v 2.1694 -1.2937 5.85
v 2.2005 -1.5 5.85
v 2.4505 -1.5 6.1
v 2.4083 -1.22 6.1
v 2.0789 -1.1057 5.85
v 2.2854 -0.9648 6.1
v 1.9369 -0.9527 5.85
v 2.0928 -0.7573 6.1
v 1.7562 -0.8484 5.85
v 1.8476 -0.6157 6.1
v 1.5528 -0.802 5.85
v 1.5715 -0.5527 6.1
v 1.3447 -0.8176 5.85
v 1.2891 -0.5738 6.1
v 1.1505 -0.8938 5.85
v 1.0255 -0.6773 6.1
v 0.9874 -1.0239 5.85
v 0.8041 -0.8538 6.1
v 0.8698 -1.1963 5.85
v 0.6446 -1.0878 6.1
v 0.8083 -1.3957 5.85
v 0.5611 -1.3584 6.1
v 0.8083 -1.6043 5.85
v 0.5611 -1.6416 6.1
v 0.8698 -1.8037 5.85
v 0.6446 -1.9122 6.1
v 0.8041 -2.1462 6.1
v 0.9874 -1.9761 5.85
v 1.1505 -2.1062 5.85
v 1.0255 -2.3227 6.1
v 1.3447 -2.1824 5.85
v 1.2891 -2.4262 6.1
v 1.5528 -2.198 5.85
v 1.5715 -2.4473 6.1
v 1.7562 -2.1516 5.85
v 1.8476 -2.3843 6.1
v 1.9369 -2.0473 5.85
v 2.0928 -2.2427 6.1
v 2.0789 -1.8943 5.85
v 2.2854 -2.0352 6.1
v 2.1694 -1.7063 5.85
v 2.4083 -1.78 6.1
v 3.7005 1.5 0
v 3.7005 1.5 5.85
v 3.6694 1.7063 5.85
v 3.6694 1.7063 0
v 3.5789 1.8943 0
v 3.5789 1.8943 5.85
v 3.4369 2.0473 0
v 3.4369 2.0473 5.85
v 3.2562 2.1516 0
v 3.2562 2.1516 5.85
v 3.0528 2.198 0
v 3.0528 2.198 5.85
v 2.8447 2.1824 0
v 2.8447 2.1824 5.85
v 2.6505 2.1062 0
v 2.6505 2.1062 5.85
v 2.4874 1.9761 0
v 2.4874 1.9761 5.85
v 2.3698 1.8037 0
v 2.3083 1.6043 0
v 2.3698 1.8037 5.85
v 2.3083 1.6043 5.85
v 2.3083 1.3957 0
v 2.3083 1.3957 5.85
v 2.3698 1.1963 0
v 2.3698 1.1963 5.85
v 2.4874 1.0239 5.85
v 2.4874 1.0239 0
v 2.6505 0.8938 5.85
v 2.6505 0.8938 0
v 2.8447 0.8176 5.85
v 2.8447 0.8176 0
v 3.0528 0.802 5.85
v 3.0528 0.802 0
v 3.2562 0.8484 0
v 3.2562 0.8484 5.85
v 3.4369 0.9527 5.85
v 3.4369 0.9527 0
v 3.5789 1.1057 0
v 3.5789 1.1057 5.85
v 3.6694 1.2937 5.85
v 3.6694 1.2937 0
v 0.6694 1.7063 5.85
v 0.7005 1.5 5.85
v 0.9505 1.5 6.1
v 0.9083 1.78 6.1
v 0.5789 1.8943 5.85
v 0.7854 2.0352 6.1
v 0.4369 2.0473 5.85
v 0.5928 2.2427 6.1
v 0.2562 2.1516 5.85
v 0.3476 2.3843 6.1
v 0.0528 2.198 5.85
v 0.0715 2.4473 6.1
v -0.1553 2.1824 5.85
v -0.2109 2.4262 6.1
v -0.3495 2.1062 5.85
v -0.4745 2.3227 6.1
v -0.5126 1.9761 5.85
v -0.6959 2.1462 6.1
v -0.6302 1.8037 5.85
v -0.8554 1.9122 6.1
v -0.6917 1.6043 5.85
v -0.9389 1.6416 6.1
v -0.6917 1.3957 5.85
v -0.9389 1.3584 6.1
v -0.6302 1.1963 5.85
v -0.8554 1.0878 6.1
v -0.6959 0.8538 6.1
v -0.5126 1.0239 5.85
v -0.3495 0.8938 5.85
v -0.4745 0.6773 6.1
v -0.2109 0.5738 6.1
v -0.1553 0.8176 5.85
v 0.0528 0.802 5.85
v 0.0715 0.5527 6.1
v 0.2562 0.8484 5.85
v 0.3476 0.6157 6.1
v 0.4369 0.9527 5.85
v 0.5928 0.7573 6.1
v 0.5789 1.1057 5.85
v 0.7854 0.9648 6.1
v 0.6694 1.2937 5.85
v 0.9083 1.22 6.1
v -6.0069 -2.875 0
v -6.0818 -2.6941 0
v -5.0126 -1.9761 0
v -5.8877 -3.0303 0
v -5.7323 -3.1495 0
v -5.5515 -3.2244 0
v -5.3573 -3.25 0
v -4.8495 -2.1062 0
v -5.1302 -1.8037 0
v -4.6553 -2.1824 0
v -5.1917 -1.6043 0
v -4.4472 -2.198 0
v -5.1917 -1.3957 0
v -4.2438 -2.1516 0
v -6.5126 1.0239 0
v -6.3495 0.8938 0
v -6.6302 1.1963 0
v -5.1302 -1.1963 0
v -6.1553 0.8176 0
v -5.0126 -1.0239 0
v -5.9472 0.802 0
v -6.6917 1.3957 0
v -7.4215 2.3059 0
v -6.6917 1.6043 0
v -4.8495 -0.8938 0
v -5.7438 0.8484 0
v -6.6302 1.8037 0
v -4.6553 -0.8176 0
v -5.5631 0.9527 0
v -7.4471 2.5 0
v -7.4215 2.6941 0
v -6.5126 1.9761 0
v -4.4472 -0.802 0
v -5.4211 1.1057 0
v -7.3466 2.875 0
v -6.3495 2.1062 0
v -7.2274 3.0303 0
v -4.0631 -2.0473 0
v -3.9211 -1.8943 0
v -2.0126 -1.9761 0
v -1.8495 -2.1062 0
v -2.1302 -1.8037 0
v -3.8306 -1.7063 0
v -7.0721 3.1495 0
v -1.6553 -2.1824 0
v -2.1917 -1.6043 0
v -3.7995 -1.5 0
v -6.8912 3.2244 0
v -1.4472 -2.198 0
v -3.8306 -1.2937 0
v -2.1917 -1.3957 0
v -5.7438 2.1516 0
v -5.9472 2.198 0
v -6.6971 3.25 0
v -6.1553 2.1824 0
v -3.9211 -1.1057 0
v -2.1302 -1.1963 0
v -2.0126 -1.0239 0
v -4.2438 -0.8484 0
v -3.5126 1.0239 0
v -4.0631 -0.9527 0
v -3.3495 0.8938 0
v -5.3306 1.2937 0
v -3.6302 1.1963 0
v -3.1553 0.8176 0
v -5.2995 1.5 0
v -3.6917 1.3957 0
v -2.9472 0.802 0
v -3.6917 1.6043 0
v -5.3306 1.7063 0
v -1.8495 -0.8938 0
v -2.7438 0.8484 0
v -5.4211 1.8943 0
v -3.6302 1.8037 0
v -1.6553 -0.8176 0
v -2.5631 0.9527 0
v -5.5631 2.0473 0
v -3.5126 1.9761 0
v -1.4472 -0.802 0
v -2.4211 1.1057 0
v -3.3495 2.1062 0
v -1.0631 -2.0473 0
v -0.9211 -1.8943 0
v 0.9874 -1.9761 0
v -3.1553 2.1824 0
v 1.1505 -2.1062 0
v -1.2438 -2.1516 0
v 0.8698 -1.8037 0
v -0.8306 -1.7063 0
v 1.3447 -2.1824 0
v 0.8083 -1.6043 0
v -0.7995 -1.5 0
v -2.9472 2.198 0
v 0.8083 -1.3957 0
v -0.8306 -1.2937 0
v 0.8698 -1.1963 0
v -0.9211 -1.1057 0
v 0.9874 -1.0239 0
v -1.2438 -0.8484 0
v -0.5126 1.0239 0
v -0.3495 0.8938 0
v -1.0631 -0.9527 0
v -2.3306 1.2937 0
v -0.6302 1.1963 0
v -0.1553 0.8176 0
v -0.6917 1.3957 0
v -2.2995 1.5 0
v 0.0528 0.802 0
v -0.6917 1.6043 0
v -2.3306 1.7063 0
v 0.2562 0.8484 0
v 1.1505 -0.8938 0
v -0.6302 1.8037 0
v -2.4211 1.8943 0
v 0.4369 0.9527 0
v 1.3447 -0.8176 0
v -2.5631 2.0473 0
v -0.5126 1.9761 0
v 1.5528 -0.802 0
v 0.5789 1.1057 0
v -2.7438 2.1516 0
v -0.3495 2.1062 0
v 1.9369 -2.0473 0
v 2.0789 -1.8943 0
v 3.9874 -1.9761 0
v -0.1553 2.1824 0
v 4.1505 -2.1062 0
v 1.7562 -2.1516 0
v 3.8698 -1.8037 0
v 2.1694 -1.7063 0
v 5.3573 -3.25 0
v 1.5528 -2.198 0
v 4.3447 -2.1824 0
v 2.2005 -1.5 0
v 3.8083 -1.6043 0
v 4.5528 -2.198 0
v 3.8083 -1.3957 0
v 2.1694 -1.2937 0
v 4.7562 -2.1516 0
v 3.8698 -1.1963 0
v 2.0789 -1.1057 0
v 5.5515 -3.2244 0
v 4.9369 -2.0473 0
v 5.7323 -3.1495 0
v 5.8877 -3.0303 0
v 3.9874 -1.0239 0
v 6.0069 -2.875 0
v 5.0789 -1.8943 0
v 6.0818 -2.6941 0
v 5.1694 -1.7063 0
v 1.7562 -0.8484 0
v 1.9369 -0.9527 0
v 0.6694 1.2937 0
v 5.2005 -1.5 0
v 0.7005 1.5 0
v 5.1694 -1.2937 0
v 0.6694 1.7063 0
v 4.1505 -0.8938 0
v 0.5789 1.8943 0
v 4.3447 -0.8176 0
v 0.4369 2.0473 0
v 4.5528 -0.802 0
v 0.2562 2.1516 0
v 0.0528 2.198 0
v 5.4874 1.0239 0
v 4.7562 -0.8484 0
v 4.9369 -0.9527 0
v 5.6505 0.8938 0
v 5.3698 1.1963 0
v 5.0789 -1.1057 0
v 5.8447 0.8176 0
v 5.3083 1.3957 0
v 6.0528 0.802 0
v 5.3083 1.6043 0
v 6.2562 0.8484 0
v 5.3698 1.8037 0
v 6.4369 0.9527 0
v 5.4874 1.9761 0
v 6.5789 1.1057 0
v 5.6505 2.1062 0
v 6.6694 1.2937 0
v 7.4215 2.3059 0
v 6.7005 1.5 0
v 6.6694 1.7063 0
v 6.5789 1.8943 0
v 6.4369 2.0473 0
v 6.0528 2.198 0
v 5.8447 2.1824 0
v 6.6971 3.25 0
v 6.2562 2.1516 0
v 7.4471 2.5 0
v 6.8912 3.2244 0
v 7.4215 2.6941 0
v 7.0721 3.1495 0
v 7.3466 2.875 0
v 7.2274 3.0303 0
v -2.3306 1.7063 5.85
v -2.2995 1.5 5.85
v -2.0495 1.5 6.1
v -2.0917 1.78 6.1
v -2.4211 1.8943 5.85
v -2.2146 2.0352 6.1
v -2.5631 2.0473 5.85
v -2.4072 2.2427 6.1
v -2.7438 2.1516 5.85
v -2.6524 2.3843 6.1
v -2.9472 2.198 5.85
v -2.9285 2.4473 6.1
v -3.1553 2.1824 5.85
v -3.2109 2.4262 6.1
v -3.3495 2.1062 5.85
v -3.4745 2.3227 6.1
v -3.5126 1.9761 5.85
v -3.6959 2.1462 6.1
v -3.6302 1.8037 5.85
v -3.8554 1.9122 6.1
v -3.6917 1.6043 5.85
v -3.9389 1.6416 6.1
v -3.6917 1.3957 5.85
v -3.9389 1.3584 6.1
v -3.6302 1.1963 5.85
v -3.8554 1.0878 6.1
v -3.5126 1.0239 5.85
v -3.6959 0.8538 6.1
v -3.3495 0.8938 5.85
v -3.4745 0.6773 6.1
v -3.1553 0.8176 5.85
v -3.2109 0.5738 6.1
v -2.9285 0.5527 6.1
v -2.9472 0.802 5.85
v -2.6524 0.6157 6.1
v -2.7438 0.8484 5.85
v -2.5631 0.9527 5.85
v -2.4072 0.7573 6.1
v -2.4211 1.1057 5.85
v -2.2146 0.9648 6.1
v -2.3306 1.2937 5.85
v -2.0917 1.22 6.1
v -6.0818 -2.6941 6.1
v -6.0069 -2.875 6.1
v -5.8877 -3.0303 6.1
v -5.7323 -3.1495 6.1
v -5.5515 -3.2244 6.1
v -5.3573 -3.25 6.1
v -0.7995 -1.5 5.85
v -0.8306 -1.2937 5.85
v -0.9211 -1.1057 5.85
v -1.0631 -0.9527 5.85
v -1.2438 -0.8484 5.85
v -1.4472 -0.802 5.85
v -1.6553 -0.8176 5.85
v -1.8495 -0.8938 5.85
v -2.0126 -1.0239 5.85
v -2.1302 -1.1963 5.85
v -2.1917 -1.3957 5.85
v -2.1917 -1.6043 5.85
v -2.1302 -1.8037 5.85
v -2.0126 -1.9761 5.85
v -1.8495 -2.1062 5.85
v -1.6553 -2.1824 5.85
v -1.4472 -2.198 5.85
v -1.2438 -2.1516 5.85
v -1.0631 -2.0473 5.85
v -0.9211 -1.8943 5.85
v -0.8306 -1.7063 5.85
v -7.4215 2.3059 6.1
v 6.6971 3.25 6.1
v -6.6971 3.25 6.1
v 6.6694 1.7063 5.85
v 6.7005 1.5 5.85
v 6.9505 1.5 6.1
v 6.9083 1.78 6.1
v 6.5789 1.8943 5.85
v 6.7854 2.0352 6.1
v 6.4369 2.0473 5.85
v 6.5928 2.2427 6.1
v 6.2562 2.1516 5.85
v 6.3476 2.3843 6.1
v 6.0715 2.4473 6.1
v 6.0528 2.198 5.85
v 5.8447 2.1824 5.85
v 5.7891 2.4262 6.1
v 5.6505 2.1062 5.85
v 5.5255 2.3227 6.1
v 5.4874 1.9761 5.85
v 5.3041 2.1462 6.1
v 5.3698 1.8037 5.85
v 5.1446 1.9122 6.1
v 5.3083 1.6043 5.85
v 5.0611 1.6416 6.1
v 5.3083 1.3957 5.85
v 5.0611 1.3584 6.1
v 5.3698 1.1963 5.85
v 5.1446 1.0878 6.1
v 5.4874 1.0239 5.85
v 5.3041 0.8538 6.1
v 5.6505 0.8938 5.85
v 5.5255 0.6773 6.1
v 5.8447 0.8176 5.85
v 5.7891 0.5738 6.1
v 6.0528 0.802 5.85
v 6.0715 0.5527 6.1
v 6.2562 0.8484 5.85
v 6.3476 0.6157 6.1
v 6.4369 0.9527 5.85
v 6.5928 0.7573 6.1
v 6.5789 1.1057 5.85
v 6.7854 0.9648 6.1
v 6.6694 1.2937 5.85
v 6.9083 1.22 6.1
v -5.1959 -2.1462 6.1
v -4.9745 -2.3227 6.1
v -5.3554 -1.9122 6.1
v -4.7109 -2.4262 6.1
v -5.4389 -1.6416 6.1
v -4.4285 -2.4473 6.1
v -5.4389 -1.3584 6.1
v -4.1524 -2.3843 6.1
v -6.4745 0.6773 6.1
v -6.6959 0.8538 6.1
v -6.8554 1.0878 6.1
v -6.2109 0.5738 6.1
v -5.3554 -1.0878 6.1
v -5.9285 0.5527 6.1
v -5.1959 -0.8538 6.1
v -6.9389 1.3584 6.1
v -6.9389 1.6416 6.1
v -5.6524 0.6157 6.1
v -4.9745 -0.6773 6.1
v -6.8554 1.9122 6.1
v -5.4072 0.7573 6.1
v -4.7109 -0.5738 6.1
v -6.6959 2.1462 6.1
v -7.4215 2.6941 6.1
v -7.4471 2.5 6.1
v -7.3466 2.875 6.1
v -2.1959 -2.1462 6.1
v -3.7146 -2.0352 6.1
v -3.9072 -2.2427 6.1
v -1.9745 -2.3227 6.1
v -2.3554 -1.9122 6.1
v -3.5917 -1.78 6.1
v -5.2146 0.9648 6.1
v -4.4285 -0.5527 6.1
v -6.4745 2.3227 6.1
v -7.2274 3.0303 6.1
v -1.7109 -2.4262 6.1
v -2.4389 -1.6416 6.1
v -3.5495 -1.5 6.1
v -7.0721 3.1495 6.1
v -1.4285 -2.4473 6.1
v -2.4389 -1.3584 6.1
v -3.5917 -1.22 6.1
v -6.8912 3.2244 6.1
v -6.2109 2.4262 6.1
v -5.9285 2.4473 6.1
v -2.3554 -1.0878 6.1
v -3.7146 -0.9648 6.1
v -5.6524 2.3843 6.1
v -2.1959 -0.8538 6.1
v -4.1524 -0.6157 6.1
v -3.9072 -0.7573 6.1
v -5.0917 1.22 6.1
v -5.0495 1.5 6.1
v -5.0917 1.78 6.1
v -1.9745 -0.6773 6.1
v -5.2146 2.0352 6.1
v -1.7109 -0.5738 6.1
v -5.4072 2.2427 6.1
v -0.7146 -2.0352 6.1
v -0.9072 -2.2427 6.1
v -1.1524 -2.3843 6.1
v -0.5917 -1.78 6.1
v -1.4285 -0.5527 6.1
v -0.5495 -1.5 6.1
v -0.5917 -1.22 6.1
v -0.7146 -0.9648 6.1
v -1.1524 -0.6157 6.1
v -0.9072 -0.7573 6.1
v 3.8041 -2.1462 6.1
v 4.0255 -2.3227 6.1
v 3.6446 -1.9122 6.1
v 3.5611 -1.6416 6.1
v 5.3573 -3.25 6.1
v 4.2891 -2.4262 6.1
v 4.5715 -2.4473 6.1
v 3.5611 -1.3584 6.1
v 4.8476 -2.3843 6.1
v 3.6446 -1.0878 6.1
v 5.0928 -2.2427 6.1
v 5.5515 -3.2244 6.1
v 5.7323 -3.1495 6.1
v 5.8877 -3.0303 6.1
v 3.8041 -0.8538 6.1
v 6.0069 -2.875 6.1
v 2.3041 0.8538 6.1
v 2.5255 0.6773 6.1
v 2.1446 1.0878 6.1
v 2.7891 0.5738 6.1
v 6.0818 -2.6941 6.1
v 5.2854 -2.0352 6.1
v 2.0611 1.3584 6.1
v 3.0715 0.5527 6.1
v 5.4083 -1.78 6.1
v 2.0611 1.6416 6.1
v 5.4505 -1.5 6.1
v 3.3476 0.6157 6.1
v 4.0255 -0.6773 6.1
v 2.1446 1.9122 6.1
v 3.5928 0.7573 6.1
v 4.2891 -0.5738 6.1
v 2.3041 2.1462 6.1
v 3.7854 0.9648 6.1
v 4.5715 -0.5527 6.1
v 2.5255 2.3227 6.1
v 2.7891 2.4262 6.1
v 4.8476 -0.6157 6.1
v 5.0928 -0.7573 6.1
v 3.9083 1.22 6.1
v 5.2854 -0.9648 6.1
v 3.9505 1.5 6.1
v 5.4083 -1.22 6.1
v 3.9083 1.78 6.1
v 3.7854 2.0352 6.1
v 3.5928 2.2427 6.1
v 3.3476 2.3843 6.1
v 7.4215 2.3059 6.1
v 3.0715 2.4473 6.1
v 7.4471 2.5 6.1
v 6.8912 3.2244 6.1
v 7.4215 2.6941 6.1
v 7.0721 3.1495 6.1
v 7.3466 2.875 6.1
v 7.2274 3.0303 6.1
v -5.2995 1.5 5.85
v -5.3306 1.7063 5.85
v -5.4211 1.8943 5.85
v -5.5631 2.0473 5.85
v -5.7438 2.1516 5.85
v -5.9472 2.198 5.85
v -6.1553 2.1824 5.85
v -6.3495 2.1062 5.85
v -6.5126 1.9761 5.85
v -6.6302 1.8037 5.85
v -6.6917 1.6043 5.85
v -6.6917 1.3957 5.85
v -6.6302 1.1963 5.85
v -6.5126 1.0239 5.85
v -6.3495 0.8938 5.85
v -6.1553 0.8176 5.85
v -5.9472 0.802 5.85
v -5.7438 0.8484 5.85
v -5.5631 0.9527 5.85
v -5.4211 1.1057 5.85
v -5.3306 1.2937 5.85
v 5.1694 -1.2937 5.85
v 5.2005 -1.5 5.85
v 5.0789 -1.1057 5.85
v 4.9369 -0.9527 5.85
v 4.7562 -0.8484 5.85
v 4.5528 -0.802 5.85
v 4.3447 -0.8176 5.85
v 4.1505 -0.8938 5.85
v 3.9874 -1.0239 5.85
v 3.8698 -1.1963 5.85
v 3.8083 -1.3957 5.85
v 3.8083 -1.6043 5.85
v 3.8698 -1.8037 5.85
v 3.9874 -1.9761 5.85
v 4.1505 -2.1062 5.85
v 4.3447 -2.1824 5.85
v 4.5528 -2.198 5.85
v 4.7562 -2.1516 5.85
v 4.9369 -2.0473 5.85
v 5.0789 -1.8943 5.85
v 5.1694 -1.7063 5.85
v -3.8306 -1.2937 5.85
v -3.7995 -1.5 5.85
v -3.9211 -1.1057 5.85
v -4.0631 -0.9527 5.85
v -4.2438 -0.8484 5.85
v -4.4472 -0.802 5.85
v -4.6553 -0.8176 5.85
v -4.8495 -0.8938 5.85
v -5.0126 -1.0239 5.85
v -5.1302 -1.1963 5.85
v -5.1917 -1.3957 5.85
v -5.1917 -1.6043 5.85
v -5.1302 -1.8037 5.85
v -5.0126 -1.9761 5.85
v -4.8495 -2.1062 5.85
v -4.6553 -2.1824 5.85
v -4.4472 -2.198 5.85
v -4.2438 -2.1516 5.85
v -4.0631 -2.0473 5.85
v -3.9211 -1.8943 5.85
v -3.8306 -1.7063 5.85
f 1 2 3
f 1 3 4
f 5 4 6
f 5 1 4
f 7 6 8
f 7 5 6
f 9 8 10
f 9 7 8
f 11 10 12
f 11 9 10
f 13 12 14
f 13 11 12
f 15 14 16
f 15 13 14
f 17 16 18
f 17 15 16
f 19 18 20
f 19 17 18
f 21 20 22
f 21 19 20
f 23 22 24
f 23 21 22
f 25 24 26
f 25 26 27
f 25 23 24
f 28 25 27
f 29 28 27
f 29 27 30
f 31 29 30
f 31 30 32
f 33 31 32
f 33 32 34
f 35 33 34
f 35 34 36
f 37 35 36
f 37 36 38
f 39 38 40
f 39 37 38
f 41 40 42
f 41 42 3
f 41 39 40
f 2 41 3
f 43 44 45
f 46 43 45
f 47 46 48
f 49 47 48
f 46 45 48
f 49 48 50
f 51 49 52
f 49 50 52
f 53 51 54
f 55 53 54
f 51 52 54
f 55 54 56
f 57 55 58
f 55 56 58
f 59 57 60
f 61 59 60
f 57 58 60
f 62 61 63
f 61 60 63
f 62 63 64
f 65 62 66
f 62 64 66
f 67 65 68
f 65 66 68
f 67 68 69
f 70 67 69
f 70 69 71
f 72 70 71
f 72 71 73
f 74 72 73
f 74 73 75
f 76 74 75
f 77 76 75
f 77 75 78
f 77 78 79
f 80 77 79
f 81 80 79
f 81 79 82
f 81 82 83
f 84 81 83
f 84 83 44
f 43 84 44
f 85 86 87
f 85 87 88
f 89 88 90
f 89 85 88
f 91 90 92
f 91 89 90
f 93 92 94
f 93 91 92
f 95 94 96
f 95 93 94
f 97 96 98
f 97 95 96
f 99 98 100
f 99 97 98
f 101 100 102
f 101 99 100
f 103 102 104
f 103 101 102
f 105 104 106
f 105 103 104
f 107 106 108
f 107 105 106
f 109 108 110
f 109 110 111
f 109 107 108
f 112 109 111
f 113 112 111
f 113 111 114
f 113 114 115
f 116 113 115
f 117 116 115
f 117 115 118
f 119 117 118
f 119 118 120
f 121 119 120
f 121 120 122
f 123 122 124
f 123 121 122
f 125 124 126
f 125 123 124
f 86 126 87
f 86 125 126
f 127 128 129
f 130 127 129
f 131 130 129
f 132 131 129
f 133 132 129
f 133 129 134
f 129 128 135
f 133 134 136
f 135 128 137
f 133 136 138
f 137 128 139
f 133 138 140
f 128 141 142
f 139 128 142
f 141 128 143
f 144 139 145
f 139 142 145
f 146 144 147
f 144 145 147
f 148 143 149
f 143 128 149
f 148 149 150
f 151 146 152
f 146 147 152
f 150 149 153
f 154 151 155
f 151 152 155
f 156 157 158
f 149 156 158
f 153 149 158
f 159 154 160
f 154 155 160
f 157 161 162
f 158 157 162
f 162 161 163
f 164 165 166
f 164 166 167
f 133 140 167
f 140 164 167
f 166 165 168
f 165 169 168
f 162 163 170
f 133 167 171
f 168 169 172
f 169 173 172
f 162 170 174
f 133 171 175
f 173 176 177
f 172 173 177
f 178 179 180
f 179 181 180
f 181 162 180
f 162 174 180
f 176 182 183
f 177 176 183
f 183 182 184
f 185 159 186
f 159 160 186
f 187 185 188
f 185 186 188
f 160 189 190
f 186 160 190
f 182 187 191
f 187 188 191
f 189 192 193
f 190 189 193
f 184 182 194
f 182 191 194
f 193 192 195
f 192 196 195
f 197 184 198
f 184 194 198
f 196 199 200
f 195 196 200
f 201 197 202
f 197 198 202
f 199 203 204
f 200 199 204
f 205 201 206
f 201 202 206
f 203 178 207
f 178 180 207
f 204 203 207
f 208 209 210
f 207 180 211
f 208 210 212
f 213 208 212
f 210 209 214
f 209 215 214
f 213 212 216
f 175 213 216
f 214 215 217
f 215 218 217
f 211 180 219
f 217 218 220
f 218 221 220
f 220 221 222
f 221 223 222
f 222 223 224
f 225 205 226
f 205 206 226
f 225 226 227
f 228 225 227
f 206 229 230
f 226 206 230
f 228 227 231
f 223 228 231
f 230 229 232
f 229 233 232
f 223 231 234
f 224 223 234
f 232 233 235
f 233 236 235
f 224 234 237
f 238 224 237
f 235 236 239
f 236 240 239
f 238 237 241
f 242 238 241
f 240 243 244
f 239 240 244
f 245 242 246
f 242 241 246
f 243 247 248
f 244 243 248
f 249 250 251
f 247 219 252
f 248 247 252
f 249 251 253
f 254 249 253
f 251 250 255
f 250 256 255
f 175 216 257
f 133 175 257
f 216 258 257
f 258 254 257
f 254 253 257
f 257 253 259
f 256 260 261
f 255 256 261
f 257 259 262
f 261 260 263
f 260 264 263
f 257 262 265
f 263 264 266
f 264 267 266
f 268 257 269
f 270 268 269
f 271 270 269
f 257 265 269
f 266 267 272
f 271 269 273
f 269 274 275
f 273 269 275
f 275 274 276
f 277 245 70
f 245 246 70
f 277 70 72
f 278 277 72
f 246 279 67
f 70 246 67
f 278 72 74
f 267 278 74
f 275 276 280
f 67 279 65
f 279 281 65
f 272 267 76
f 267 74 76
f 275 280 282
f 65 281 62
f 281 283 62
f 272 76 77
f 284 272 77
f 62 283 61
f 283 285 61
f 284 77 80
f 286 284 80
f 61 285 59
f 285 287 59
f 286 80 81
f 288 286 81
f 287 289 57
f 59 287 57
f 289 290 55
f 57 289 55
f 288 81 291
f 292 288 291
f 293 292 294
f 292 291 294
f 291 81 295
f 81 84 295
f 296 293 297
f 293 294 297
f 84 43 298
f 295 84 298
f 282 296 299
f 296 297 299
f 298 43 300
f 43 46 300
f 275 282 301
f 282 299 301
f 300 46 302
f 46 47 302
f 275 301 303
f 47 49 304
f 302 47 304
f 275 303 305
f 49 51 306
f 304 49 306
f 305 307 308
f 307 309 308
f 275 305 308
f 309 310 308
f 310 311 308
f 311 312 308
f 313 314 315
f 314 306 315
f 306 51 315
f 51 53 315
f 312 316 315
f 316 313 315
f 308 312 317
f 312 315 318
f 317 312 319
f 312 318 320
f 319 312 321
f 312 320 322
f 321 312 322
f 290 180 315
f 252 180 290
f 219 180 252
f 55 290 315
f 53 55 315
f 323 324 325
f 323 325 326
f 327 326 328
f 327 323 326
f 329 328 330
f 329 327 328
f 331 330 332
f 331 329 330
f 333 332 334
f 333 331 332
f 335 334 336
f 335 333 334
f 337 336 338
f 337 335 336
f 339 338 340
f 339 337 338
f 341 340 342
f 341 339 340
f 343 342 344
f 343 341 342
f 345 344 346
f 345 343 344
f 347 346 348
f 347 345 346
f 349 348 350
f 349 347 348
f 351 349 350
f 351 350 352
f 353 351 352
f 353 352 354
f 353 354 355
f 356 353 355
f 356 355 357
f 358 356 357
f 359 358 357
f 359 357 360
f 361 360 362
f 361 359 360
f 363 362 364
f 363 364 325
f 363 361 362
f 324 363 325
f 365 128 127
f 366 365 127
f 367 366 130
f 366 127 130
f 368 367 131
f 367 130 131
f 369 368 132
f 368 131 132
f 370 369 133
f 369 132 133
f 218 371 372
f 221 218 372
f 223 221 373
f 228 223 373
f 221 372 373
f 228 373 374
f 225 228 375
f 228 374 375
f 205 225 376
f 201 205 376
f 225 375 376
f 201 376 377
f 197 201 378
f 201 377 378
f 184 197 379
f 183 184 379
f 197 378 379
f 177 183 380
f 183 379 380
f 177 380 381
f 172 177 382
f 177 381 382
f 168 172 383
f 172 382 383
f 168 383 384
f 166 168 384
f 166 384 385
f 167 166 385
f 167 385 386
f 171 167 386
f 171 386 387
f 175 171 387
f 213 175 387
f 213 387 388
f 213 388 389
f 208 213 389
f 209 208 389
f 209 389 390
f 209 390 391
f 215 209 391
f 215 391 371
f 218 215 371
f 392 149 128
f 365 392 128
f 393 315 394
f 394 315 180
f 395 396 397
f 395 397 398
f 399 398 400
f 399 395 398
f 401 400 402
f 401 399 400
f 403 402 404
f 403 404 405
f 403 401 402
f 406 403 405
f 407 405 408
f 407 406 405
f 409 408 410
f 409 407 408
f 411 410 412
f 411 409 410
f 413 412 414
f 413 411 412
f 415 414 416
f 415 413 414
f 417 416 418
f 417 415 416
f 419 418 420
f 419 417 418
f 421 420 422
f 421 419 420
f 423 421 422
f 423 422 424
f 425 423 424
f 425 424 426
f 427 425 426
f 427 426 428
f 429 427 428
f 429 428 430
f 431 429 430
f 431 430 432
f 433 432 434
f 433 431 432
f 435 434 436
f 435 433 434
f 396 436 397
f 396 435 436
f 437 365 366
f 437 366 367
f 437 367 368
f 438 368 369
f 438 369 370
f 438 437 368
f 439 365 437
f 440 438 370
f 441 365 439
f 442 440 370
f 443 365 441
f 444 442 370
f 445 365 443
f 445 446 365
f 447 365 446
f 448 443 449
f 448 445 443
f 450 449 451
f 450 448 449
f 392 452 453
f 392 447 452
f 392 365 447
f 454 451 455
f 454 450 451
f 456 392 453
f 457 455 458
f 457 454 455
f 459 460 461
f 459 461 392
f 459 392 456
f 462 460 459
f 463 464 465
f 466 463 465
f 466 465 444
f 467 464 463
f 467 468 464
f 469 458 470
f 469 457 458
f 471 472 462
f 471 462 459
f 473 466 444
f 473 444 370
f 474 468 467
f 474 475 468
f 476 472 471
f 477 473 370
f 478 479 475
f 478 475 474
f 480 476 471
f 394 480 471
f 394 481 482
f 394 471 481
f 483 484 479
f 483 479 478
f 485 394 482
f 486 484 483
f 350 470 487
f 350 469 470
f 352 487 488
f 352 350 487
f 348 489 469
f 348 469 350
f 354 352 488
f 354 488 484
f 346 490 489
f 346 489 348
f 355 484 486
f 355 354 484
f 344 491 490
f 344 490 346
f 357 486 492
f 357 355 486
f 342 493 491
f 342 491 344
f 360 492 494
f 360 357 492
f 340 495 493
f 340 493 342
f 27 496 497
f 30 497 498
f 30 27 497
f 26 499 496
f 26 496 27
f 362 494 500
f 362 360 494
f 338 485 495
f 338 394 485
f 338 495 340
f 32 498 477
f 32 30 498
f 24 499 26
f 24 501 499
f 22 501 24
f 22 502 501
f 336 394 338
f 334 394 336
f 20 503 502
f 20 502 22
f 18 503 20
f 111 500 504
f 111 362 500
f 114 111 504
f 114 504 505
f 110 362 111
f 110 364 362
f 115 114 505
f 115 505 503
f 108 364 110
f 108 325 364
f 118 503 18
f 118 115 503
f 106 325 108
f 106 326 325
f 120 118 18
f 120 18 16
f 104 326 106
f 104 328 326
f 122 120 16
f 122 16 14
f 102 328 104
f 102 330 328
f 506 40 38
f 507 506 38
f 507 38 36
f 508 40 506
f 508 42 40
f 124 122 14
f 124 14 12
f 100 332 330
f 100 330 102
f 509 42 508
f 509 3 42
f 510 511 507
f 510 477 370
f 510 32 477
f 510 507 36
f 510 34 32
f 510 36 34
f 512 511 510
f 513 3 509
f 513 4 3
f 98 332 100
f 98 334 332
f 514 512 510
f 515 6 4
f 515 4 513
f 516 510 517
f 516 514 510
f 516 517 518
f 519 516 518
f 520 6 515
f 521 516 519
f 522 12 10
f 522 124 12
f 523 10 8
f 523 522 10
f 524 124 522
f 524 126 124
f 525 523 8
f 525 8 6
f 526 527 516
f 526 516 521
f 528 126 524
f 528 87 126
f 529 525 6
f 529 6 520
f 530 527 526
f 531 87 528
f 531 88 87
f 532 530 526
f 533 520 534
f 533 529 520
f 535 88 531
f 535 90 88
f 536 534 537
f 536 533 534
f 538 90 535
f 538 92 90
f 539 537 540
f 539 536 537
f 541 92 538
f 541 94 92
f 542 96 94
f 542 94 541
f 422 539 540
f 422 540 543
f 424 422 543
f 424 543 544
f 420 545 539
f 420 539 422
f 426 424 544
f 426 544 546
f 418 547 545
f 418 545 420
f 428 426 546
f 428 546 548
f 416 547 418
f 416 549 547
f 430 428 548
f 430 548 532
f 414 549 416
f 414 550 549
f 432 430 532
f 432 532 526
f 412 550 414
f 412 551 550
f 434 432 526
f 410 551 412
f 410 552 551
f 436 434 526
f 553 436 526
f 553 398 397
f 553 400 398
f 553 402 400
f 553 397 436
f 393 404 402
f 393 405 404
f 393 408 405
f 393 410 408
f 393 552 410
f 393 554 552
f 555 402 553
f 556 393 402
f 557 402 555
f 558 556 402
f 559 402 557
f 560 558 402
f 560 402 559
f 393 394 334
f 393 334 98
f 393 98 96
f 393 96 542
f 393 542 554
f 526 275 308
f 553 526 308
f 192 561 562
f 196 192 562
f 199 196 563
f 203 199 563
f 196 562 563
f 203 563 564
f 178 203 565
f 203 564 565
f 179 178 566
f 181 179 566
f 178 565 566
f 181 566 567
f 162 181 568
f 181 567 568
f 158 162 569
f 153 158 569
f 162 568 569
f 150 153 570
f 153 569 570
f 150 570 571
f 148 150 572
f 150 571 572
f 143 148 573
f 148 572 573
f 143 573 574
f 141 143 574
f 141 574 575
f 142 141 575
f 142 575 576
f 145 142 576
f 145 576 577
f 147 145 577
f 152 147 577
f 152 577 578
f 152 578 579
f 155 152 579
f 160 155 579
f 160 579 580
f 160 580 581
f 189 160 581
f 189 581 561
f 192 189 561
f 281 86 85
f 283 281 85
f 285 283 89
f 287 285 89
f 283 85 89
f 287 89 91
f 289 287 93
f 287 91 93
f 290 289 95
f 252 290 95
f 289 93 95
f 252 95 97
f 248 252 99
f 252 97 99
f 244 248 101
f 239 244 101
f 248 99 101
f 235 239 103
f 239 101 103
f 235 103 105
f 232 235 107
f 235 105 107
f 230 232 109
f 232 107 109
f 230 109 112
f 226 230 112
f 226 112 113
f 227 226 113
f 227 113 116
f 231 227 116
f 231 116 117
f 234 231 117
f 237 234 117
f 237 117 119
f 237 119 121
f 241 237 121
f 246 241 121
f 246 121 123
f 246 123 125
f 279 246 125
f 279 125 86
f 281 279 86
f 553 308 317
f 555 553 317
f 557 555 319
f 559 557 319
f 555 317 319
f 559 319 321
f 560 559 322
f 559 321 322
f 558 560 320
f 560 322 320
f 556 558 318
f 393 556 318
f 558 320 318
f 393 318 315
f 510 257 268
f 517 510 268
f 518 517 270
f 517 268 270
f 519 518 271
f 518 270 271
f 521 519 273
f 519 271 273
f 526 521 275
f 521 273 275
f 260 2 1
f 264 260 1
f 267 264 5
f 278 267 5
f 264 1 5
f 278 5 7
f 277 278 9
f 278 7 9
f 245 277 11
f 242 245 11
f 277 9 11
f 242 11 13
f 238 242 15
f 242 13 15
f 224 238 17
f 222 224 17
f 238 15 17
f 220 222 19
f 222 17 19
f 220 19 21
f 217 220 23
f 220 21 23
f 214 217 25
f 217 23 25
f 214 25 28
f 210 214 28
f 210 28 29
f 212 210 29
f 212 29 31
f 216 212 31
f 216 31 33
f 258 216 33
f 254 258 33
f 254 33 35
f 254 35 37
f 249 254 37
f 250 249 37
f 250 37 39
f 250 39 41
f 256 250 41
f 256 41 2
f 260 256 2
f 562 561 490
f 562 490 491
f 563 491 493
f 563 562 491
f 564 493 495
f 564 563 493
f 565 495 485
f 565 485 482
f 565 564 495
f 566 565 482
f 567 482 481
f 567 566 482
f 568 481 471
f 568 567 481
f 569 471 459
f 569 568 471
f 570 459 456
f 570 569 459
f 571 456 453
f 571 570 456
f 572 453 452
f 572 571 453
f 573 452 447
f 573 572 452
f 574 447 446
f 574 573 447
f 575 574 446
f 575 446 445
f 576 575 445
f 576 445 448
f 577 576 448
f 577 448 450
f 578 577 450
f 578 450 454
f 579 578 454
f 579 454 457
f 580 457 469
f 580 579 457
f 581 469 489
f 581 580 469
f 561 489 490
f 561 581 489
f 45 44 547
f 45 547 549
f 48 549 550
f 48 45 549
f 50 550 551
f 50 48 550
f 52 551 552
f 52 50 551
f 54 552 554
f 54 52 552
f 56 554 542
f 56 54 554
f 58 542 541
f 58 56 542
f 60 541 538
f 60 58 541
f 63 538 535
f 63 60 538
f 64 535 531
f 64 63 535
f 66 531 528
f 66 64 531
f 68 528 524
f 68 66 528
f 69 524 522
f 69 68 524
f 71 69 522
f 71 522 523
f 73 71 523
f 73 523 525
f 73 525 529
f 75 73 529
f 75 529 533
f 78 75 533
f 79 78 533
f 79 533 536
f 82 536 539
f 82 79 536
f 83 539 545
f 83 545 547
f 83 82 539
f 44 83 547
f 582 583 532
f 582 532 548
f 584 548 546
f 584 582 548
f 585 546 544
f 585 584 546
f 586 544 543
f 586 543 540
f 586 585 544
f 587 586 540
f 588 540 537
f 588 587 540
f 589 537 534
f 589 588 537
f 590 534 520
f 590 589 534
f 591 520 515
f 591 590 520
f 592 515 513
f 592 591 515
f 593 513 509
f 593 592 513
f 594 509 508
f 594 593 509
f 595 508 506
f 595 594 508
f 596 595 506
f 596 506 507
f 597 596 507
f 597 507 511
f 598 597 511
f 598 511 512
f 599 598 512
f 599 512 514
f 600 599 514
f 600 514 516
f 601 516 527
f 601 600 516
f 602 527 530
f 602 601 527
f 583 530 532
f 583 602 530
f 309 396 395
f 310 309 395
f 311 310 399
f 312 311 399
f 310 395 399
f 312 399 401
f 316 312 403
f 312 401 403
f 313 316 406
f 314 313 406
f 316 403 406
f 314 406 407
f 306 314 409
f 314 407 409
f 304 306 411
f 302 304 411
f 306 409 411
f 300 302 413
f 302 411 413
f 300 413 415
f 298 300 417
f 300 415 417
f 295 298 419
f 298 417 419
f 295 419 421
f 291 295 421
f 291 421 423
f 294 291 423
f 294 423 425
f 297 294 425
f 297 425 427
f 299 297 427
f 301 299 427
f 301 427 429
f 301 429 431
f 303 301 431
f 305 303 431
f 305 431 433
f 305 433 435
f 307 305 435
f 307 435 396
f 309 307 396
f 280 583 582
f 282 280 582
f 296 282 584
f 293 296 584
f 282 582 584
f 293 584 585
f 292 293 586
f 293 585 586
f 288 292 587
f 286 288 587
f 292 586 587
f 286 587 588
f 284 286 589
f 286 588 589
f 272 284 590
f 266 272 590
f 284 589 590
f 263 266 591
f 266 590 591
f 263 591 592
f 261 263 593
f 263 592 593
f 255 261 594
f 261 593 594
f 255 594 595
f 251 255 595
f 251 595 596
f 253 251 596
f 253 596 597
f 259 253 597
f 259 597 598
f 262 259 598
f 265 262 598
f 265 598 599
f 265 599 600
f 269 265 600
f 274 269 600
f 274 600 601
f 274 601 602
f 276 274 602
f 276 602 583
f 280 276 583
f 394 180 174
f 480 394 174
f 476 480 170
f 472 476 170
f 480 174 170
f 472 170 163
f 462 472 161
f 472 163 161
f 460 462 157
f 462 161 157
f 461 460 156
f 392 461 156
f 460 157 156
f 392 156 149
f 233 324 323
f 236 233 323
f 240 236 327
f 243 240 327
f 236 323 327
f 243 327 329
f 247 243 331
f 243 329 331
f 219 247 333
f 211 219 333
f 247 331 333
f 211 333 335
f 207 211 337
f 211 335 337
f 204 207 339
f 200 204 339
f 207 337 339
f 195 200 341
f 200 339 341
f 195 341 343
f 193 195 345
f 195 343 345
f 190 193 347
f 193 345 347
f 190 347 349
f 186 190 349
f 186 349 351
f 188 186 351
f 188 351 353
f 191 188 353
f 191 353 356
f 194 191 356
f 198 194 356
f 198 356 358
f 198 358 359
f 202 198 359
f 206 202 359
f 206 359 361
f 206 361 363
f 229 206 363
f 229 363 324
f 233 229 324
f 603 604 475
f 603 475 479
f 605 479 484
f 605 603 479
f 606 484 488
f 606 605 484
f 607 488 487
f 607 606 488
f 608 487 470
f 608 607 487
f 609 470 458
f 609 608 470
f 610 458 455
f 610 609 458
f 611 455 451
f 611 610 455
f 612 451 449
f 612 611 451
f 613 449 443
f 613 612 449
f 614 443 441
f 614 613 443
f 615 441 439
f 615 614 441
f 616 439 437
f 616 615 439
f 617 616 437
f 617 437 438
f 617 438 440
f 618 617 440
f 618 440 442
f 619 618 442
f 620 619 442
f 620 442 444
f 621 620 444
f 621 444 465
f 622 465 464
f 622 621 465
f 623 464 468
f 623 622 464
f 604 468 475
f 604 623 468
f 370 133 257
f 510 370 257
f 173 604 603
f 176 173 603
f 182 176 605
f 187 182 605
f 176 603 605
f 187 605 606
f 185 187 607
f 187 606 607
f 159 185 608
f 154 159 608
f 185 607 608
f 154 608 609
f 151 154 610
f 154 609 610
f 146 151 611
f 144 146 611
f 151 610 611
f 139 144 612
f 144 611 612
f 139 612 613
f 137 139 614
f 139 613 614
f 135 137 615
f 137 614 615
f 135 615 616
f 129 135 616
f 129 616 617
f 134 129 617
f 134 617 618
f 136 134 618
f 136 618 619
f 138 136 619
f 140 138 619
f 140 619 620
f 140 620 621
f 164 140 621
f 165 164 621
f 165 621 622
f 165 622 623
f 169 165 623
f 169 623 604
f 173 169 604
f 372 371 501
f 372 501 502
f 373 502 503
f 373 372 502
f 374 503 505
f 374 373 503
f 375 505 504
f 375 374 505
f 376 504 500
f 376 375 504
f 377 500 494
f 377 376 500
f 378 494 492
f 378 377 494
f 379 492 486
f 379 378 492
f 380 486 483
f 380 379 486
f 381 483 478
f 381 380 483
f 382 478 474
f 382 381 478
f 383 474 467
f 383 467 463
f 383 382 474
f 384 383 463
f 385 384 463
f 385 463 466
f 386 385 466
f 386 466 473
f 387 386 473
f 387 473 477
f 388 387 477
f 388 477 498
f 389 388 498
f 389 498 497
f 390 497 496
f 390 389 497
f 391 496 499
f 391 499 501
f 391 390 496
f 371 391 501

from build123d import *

# Parameters (mm, degrees)
BOSS_EXTRUDE1_DEPTH = 6.1
CUT_EXTRUDE1_REACH  = 12.16
SKETCH2_R           = 0.7
CHAMFER1_SIZE       = 0.25


with BuildPart() as part:
    # Sketch1 → Boss-Extrude1 (new body)
    with BuildSketch(Plane.XY):
        with BuildLine():
            ThreePointArc((-6.081784137, -2.694114284), (-5.813910839, -3.095015005), (-5.357339767, -3.25))
            Line((-5.357339767, -3.25), (5.357339767, -3.25))
            ThreePointArc((5.357339767, -3.25), (5.813910839, -3.095015005), (6.081784137, -2.694114284))
            Line((6.081784137, -2.694114284), (7.421530099, 2.305885716))
            ThreePointArc((7.421530099, 2.305885716), (7.292100735, 2.956571072), (6.697085729, 3.25))
            Line((6.697085729, 3.25), (-6.697085729, 3.25))
            ThreePointArc((-6.697085729, 3.25), (-7.292100735, 2.956571072), (-7.421530099, 2.305885716))
            Line((-7.421530099, 2.305885716), (-6.081784137, -2.694114284))
        make_face()
    extrude(amount=BOSS_EXTRUDE1_DEPTH)

    # Sketch2 → Cut-Extrude1 (cut, up to next)
    with BuildSketch(Plane.XY.offset(6.1), mode=Mode.PRIVATE) as cut_extrude1_sk1:
        with Locations((-5.999496922, 1.5)):
            Circle(SKETCH2_R)
    cut_extrude1_tool1 = extrude(cut_extrude1_sk1.sketch, amount=-CUT_EXTRUDE1_REACH, mode=Mode.PRIVATE) & part.part
    # Sketch2 → Cut-Extrude1 (cut, up to next)
    with BuildSketch(Plane.XY.offset(6.1), mode=Mode.PRIVATE) as cut_extrude1_sk2:
        with Locations((-2.999496922, 1.5)):
            Circle(SKETCH2_R)
    cut_extrude1_tool2 = extrude(cut_extrude1_sk2.sketch, amount=-CUT_EXTRUDE1_REACH, mode=Mode.PRIVATE) & part.part
    # Sketch2 → Cut-Extrude1 (cut, up to next)
    with BuildSketch(Plane.XY.offset(6.1), mode=Mode.PRIVATE) as cut_extrude1_sk3:
        with Locations((0.000503078, 1.5)):
            Circle(SKETCH2_R)
    cut_extrude1_tool3 = extrude(cut_extrude1_sk3.sketch, amount=-CUT_EXTRUDE1_REACH, mode=Mode.PRIVATE) & part.part
    # Sketch2 → Cut-Extrude1 (cut, up to next)
    with BuildSketch(Plane.XY.offset(6.1), mode=Mode.PRIVATE) as cut_extrude1_sk4:
        with Locations((3.000503078, 1.5)):
            Circle(SKETCH2_R)
    cut_extrude1_tool4 = extrude(cut_extrude1_sk4.sketch, amount=-CUT_EXTRUDE1_REACH, mode=Mode.PRIVATE) & part.part
    # Sketch2 → Cut-Extrude1 (cut, up to next)
    with BuildSketch(Plane.XY.offset(6.1), mode=Mode.PRIVATE) as cut_extrude1_sk5:
        with Locations((6.000503078, 1.5)):
            Circle(SKETCH2_R)
    cut_extrude1_tool5 = extrude(cut_extrude1_sk5.sketch, amount=-CUT_EXTRUDE1_REACH, mode=Mode.PRIVATE) & part.part
    # Sketch2 → Cut-Extrude1 (cut, up to next)
    with BuildSketch(Plane.XY.offset(6.1), mode=Mode.PRIVATE) as cut_extrude1_sk6:
        with Locations((-4.499496922, -1.5)):
            Circle(SKETCH2_R)
    cut_extrude1_tool6 = extrude(cut_extrude1_sk6.sketch, amount=-CUT_EXTRUDE1_REACH, mode=Mode.PRIVATE) & part.part
    # Sketch2 → Cut-Extrude1 (cut, up to next)
    with BuildSketch(Plane.XY.offset(6.1), mode=Mode.PRIVATE) as cut_extrude1_sk7:
        with Locations((-1.499496922, -1.5)):
            Circle(SKETCH2_R)
    cut_extrude1_tool7 = extrude(cut_extrude1_sk7.sketch, amount=-CUT_EXTRUDE1_REACH, mode=Mode.PRIVATE) & part.part
    # Sketch2 → Cut-Extrude1 (cut, up to next)
    with BuildSketch(Plane.XY.offset(6.1), mode=Mode.PRIVATE) as cut_extrude1_sk8:
        with Locations((1.500503078, -1.5)):
            Circle(SKETCH2_R)
    cut_extrude1_tool8 = extrude(cut_extrude1_sk8.sketch, amount=-CUT_EXTRUDE1_REACH, mode=Mode.PRIVATE) & part.part
    # Sketch2 → Cut-Extrude1 (cut, up to next)
    with BuildSketch(Plane.XY.offset(6.1), mode=Mode.PRIVATE) as cut_extrude1_sk9:
        with Locations((4.500503078, -1.5)):
            Circle(SKETCH2_R)
    cut_extrude1_tool9 = extrude(cut_extrude1_sk9.sketch, amount=-CUT_EXTRUDE1_REACH, mode=Mode.PRIVATE) & part.part
    add(cut_extrude1_tool1.solids().sort_by_distance((-5.999497, 1.5, 6.1))[0], mode=Mode.SUBTRACT)
    add(cut_extrude1_tool2.solids().sort_by_distance((-2.999497, 1.5, 6.1))[0], mode=Mode.SUBTRACT)
    add(cut_extrude1_tool3.solids().sort_by_distance((0.000503, 1.5, 6.1))[0], mode=Mode.SUBTRACT)
    add(cut_extrude1_tool4.solids().sort_by_distance((3.000503, 1.5, 6.1))[0], mode=Mode.SUBTRACT)
    add(cut_extrude1_tool5.solids().sort_by_distance((6.000503, 1.5, 6.1))[0], mode=Mode.SUBTRACT)
    add(cut_extrude1_tool6.solids().sort_by_distance((-4.499497, -1.5, 6.1))[0], mode=Mode.SUBTRACT)
    add(cut_extrude1_tool7.solids().sort_by_distance((-1.499497, -1.5, 6.1))[0], mode=Mode.SUBTRACT)
    add(cut_extrude1_tool8.solids().sort_by_distance((1.500503, -1.5, 6.1))[0], mode=Mode.SUBTRACT)
    add(cut_extrude1_tool9.solids().sort_by_distance((4.500503, -1.5, 6.1))[0], mode=Mode.SUBTRACT)

    # Chamfer1
    chamfer1_edges = [part.edges().sort_by_distance(p)[0] for p in [
        (-5.199496922, -1.5, 6.1),
        (-2.199496922, -1.5, 6.1),
        (0.800503078, -1.5, 6.1),
        (3.800503078, -1.5, 6.1),
        (5.300503078, 1.5, 6.1),
        (2.300503078, 1.5, 6.1),
        (-0.699496922, 1.5, 6.1),
        (-3.699496922, 1.5, 6.1),
        (-6.699496922, 1.5, 6.1),
    ]]
    chamfer(chamfer1_edges, length=CHAMFER1_SIZE)


solid = part.part
